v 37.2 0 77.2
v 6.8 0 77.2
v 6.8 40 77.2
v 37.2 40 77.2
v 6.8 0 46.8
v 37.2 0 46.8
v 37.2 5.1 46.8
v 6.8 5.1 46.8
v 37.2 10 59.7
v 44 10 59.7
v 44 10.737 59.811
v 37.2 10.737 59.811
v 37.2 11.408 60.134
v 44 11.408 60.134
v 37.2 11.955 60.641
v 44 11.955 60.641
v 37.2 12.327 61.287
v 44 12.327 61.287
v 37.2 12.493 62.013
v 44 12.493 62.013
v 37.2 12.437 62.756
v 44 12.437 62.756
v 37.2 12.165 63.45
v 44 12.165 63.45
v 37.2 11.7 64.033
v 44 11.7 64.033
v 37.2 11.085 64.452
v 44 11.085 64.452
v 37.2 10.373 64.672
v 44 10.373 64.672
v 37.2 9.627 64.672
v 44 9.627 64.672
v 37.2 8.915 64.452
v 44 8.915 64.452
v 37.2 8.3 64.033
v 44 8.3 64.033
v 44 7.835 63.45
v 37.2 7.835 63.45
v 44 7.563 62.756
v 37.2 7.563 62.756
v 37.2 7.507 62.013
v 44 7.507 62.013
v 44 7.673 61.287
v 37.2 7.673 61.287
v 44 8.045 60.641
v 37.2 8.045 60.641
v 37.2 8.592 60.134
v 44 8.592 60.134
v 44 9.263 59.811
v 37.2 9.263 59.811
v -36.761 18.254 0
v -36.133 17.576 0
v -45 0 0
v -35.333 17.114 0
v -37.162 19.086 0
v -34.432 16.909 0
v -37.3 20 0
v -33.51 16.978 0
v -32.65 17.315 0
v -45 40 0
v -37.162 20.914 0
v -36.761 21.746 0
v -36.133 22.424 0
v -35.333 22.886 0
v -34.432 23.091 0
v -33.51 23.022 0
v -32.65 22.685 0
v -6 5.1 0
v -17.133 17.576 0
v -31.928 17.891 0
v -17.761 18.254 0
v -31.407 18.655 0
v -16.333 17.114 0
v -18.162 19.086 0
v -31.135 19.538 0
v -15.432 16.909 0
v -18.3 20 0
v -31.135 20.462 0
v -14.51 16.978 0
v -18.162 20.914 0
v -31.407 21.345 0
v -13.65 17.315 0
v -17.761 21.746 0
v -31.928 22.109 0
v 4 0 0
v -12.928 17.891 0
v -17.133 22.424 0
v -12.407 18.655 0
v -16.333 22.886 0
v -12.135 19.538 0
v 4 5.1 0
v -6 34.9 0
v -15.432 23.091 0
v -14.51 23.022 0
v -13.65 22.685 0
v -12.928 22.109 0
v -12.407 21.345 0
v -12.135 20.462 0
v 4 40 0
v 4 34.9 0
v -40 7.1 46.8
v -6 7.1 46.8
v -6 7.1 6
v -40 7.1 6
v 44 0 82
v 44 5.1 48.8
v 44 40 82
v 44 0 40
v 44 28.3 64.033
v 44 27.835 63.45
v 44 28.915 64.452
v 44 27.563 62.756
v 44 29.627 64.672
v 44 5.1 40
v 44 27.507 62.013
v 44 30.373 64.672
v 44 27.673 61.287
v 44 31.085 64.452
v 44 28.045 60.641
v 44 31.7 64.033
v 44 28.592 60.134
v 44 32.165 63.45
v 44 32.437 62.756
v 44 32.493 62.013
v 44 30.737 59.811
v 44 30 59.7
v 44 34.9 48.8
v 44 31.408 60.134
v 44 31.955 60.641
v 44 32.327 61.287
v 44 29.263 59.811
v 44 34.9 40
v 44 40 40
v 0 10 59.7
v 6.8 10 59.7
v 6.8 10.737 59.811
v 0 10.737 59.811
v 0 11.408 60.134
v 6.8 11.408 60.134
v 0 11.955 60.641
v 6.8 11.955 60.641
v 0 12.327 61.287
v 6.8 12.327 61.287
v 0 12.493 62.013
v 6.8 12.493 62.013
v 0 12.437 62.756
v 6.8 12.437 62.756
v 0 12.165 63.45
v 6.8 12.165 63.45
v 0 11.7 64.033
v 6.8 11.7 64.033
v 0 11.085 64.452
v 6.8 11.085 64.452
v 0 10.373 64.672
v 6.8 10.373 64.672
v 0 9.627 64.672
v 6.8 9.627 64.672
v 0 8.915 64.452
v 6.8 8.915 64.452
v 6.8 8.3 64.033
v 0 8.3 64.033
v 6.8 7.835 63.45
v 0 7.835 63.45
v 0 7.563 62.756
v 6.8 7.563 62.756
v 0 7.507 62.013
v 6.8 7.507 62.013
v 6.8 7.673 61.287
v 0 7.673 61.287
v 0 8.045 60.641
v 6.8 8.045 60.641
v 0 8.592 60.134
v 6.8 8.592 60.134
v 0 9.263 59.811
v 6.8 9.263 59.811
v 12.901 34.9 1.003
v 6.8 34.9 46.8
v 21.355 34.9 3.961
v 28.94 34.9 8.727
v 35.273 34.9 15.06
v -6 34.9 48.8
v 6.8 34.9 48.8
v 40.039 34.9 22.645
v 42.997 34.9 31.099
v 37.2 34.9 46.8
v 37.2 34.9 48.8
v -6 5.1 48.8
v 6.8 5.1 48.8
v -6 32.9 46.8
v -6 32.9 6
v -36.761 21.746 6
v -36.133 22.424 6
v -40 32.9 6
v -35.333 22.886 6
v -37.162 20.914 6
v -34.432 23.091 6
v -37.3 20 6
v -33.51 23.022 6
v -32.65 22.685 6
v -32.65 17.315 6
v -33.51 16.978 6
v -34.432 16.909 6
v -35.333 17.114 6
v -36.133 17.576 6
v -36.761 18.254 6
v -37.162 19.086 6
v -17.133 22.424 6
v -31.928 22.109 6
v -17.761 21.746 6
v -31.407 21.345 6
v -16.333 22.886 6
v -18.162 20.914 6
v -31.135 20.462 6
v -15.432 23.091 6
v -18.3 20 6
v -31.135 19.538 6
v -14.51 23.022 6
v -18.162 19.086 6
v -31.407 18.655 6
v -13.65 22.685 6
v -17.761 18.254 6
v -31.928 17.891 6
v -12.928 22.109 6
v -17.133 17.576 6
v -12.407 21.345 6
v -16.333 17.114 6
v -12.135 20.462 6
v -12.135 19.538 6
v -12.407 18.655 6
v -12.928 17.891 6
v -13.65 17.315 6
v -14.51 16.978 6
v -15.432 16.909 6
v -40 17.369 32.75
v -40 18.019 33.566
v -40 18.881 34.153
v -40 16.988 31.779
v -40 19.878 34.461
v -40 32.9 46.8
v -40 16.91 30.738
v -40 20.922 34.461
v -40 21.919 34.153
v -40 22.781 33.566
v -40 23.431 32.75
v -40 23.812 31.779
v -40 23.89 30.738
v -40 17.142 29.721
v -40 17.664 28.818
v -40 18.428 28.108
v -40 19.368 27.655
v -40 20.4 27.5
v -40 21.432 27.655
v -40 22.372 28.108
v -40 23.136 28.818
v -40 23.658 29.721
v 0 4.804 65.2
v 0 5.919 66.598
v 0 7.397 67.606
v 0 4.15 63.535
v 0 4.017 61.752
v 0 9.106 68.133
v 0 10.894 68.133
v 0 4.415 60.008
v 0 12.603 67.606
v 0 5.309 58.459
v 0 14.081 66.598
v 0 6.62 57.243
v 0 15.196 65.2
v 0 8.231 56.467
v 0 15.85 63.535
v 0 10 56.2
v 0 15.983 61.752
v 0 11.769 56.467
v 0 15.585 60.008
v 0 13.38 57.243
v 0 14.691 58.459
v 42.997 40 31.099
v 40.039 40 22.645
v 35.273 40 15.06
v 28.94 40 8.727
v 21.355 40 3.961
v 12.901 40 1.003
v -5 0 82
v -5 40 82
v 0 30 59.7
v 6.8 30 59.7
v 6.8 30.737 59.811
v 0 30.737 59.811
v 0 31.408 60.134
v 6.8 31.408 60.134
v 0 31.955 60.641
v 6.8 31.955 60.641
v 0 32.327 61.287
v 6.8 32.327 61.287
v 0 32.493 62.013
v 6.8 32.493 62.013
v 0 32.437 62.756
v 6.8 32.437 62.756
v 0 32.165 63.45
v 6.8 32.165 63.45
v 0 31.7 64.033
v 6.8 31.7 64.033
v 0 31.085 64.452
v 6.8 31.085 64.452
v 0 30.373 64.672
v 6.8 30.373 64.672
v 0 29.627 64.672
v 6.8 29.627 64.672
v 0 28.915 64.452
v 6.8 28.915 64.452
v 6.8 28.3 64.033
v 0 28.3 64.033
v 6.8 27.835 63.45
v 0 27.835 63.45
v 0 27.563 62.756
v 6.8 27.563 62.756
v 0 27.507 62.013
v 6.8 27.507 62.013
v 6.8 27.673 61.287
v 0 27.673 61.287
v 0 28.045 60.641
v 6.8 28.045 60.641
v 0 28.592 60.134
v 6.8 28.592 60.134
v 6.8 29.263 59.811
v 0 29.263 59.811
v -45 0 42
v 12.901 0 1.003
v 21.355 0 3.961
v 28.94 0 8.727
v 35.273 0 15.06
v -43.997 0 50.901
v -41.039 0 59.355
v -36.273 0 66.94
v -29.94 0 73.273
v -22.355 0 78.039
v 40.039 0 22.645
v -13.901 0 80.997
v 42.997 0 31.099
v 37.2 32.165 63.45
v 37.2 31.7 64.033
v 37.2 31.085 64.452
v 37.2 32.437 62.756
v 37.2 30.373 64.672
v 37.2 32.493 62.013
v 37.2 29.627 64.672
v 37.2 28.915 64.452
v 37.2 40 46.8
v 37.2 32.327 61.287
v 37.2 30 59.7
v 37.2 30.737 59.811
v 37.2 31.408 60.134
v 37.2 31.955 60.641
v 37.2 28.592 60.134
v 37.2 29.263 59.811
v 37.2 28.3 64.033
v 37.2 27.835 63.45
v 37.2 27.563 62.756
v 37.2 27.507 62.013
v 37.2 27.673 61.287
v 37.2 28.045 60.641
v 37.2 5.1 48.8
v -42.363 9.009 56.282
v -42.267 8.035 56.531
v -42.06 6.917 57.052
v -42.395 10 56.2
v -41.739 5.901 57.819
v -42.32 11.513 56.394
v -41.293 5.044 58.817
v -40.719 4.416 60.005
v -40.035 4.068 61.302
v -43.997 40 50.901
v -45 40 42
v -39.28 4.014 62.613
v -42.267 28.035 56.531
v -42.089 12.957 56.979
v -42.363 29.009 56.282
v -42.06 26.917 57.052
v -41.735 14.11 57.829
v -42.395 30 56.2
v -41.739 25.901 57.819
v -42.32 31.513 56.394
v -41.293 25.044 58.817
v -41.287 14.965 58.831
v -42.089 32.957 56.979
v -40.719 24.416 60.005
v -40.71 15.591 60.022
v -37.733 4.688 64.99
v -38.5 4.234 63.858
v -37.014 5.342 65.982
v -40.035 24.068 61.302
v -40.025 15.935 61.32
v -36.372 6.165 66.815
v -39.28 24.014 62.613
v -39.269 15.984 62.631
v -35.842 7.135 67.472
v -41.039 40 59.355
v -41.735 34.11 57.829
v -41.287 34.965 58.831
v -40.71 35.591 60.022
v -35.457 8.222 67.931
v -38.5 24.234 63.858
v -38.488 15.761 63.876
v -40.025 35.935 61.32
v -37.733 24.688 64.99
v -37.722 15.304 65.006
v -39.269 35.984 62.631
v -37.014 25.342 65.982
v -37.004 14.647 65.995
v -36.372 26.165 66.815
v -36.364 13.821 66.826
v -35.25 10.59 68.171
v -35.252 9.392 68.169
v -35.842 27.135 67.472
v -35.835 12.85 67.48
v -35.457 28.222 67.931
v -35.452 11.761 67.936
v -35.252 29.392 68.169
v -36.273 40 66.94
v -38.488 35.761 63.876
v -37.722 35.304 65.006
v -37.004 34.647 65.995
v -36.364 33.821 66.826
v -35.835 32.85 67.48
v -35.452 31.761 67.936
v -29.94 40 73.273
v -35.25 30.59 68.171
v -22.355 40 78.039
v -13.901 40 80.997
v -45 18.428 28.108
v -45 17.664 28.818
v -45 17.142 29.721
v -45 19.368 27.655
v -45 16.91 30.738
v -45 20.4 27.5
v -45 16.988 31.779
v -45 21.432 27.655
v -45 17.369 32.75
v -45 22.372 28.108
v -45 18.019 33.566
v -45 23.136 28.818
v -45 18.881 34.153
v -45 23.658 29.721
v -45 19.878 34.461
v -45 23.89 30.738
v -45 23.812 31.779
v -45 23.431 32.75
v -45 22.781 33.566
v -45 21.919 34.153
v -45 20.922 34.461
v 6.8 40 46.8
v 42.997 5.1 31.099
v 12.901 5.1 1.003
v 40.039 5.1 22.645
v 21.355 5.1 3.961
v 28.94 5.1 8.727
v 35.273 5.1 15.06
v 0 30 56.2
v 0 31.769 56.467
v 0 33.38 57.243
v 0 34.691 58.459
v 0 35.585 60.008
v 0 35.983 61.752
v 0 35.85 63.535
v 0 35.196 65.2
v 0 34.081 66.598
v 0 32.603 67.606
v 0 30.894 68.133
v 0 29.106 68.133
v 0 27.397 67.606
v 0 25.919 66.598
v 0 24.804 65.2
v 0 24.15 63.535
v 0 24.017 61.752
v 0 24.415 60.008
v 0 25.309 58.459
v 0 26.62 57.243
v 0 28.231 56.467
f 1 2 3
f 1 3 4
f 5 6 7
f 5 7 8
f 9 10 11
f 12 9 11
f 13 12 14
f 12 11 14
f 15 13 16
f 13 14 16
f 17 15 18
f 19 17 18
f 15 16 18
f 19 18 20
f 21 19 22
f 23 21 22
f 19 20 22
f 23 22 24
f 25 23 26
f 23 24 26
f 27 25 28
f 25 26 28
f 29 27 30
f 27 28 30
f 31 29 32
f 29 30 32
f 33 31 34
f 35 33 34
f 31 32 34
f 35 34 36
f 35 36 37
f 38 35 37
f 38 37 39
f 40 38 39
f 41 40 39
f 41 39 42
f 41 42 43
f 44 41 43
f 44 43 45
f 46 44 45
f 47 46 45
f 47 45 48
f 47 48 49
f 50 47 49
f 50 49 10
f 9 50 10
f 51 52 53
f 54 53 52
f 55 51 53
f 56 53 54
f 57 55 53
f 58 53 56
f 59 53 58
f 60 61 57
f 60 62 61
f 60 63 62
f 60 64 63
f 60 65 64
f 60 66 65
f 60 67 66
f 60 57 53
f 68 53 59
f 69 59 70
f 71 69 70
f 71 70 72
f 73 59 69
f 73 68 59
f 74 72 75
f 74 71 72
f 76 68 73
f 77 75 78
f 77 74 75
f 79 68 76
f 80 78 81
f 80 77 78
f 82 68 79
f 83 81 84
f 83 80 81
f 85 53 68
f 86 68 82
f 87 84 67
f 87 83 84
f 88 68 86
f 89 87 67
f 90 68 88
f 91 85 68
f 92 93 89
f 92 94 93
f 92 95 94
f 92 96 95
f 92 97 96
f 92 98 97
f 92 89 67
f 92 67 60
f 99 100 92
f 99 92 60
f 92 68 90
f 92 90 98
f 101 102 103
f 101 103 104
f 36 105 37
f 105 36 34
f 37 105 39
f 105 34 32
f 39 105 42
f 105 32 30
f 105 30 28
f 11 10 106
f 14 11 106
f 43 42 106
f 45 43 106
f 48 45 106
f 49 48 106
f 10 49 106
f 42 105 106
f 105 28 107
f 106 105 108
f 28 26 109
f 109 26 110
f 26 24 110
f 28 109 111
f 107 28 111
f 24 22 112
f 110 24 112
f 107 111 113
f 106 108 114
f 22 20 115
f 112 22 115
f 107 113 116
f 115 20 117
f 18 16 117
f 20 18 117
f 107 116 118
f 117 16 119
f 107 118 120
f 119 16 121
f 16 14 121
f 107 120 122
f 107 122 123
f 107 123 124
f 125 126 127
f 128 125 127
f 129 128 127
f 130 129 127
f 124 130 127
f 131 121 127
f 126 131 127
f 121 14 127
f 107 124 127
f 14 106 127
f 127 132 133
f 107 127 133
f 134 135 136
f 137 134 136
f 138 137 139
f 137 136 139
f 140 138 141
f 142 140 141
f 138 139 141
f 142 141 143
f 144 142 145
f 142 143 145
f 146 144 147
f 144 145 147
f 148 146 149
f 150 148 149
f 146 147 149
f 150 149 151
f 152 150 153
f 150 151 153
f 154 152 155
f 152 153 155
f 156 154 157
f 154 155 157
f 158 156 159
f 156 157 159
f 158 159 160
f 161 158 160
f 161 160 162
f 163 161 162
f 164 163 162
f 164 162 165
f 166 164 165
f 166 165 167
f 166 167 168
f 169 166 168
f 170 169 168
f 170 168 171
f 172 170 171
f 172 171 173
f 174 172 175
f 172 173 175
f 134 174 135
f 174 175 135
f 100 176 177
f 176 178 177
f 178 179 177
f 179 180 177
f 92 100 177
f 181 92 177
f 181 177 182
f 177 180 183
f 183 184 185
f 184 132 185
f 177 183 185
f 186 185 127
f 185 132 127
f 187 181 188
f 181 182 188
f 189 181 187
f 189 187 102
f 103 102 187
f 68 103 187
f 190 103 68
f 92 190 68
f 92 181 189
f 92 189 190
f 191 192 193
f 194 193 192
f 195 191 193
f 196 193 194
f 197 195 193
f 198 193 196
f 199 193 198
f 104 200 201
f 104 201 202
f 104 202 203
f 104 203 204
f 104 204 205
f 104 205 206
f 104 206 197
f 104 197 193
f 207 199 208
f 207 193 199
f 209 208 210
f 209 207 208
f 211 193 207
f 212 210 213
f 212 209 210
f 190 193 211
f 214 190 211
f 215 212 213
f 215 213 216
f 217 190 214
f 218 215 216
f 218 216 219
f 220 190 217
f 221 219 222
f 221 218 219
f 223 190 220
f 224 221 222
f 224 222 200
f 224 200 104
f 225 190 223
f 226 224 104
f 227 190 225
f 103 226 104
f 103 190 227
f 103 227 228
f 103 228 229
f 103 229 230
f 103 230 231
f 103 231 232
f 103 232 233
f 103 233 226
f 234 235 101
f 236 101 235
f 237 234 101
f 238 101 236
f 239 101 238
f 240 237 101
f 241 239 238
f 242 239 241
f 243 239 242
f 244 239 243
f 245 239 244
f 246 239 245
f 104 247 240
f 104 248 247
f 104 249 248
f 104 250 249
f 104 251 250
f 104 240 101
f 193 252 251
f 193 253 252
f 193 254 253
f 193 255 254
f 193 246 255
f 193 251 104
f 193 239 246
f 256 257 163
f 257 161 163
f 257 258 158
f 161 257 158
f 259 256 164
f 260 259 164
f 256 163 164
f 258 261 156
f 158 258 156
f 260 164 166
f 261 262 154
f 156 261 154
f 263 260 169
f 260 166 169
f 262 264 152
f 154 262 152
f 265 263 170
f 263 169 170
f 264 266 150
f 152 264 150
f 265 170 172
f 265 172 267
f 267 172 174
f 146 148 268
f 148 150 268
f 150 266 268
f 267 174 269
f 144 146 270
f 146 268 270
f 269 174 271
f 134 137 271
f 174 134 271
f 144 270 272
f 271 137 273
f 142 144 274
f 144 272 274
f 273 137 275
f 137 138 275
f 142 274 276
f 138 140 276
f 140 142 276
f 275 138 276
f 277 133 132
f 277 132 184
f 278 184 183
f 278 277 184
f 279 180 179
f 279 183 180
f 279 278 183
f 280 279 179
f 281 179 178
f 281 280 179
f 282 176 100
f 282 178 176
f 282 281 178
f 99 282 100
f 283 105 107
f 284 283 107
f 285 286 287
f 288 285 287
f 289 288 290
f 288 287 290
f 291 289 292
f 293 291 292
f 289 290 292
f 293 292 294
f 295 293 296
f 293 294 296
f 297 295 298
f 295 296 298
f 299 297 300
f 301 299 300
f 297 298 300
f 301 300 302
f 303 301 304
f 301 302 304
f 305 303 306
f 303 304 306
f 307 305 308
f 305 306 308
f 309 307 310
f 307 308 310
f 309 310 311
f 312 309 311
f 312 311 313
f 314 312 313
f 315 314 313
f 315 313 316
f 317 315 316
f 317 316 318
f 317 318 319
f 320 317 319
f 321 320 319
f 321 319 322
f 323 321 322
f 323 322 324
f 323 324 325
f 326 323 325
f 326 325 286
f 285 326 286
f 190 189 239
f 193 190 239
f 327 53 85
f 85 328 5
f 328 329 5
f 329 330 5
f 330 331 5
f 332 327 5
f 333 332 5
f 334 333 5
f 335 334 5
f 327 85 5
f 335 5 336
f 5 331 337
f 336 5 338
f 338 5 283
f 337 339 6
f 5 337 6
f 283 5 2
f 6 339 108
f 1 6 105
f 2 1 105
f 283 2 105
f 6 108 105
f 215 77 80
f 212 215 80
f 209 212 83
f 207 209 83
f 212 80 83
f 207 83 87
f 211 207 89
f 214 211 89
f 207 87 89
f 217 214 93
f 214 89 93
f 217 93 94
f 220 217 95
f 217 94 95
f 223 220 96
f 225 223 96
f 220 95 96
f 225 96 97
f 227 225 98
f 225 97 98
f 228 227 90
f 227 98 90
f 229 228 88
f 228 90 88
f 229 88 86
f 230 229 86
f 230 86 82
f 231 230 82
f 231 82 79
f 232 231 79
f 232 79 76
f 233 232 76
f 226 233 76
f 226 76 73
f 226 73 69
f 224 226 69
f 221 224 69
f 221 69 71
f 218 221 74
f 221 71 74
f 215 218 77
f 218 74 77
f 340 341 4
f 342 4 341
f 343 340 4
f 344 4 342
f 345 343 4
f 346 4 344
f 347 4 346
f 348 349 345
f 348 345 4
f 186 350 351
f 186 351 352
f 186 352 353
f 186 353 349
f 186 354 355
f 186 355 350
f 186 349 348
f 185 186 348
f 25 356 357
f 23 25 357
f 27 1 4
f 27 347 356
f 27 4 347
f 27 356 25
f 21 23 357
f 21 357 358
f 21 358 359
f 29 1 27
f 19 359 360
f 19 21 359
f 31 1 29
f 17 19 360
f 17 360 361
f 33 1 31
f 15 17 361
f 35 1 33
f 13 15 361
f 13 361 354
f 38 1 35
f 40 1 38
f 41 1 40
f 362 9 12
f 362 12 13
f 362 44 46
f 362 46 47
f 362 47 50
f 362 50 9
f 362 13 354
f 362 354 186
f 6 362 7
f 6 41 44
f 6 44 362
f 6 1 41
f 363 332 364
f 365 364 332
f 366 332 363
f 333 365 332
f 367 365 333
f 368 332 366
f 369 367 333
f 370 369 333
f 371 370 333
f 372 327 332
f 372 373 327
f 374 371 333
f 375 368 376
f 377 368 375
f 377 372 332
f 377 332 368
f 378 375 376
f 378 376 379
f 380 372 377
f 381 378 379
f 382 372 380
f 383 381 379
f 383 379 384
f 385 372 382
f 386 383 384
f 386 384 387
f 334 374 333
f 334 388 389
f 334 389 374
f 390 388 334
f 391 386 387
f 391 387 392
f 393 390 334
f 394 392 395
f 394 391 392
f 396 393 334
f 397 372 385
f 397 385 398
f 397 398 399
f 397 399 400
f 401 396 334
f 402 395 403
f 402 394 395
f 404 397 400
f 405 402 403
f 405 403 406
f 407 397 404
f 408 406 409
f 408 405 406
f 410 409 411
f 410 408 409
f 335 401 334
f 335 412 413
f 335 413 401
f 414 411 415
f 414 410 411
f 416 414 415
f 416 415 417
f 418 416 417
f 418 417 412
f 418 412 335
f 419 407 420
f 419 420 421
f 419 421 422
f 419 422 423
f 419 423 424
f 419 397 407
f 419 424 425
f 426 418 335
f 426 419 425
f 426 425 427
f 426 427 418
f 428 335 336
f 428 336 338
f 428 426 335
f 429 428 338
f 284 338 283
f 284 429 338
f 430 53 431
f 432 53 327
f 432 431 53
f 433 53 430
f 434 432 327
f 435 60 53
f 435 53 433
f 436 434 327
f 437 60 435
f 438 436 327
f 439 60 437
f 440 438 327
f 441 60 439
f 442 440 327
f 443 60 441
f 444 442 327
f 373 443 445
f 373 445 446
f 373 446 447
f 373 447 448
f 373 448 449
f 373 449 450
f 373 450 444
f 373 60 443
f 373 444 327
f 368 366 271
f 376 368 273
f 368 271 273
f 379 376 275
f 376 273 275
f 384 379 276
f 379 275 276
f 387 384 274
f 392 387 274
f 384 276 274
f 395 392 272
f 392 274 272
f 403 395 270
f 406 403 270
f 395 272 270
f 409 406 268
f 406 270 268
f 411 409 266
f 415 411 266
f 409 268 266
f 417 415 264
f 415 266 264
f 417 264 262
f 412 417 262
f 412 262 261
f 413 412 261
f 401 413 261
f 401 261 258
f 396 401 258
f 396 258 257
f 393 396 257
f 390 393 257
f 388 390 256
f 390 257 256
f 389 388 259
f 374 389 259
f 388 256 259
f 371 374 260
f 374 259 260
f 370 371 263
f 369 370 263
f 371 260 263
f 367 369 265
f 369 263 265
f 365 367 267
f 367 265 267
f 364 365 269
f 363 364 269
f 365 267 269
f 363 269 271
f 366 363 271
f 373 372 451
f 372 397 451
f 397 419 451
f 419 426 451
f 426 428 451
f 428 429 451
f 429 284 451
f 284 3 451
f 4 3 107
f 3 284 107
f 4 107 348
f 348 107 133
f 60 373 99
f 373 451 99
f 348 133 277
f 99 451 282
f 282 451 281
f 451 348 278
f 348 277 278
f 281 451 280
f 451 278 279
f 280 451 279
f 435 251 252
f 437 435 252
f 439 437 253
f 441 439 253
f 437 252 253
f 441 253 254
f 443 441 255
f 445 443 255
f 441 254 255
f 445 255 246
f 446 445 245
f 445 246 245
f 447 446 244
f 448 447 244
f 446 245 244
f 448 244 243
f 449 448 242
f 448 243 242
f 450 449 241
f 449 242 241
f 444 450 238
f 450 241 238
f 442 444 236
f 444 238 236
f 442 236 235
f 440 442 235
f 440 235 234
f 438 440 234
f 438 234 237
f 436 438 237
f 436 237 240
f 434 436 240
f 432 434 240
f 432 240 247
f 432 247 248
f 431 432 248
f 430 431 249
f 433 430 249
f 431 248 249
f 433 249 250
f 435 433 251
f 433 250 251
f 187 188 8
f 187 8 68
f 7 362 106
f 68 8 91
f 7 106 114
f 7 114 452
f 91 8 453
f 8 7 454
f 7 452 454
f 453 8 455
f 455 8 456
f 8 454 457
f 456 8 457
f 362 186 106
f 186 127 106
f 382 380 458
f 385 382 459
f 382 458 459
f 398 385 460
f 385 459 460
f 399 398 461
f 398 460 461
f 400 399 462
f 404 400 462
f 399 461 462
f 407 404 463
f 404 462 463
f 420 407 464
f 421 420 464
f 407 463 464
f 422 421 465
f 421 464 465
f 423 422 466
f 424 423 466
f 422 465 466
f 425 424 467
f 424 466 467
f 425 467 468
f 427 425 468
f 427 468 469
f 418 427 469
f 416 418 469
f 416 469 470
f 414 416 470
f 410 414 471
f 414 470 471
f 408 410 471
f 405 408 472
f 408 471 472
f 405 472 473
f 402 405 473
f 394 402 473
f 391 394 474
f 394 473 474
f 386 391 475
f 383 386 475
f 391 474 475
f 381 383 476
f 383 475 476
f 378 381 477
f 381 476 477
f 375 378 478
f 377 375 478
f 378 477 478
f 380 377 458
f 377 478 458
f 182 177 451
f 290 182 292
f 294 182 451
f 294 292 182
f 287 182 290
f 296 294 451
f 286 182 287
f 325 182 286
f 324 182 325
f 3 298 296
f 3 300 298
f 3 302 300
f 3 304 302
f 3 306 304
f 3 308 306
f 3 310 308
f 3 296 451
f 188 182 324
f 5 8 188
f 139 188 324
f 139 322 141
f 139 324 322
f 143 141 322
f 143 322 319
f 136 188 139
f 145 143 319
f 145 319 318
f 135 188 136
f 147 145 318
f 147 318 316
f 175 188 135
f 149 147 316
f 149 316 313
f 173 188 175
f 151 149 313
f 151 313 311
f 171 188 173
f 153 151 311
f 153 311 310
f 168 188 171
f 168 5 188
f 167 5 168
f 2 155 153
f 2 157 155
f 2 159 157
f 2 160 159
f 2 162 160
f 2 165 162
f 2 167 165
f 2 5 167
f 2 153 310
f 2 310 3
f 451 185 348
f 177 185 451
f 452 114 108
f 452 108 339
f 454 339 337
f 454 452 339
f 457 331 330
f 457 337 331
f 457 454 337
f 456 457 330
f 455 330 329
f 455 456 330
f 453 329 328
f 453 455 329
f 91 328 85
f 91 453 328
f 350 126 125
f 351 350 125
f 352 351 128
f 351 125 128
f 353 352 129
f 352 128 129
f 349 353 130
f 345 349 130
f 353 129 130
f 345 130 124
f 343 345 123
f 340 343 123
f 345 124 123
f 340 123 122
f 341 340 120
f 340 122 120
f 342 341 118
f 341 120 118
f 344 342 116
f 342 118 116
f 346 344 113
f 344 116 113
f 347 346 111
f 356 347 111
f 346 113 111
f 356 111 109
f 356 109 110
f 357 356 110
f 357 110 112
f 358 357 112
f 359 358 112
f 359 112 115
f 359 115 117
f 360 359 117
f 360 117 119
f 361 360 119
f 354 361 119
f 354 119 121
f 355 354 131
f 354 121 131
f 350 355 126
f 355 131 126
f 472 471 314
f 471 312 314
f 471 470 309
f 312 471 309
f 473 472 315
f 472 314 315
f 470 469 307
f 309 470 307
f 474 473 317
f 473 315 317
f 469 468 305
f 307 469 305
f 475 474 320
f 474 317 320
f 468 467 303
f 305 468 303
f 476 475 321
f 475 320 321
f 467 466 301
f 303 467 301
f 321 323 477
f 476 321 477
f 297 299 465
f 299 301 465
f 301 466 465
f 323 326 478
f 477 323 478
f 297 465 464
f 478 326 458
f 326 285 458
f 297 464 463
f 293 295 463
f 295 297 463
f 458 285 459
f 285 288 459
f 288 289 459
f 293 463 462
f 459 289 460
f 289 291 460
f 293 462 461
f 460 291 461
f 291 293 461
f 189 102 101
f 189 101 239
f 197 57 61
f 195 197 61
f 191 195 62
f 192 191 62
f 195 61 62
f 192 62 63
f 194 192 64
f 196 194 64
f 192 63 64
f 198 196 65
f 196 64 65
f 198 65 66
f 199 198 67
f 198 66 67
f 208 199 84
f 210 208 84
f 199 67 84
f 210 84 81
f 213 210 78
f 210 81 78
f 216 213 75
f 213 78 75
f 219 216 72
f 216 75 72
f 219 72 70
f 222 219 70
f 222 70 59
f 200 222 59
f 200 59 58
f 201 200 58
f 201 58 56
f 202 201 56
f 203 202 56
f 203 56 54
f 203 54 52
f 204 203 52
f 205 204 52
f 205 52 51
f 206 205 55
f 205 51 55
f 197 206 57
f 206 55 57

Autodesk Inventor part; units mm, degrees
ref_plane "YZ Plane" through (0, 0, 0) normal (1, 0, 0) x (0, 1, 0)
ref_plane "XZ Plane" through (0, 0, 0) normal (0, 1, 0) x (-1, 0, 0)
ref_plane "XY Plane" through (0, 0, 0) normal (0, 0, 1) x (1, 0, 0)
sketch "Sketch1" plane through (0, 0, 0) normal (0, 0, 1) x (1, 0, 0)
  line L0 (0, 0) -> (44, 0)
  line L1 (44, 0) -> (44, 40)
  line L2 (44, 40) -> (0, 40)
  line L3 (0, 40) -> (0, 0)
  dimension "d0" = 44
  dimension "d1" = 40
extrude "Extrusion1" add sketch "Sketch1" along normal blind 82
sketch "Sketch2" plane through (0, 0, 0) normal (0, -1, 0) x (1, 0, 0)
  line L0 (6.8, 77.2) -> (37.2, 77.2)
  line L1 (37.2, 77.2) -> (37.2, 46.8)
  line L2 (37.2, 46.8) -> (6.8, 46.8)
  line L3 (6.8, 46.8) -> (6.8, 77.2)
  line L4 (0, 0) -> (0, 82) projected
  line L5 (0, 82) -> (44, 82) projected
  dimension "d4" = 30.4
  dimension "d5" = 30.4
  dimension "d6" = 6.8
  dimension "d7" = 4.8
extrude "Extrusion2" cut sketch "Sketch2" against normal blind 50
sketch "Sketch6" plane through (44, 0, 0) normal (1, 0, 0) x (0, 0, -1)
  circle A0 centre (-62.2, 30) radius 2.5
  circle A1 centre (-62.2, 10) radius 2.5
  line L0 (0, 40) -> (-82, 40) projected
  line L1 (0, 0) -> (-82, 0) projected
  point P0 (-77.2, 40)
  dimension "d24" = 5
  dimension "d25" = 10
  dimension "d26" = 5
  dimension "d27" = 10
  dimension "d28" = 15
  dimension "d29" = 15
extrude "Extrusion5" cut sketch "Sketch6" against normal blind 120
sketch "Sketch8" plane through (0, 0, 0) normal (-1, 0, 0) x (0, 0, 1)
  line L0 (0, 0) -> (0, 40) projected
  line L1 (77.2, 40) -> (46.8, 40) projected
  line L2 (0, 0) -> (82, 0)
  line L3 (82, 0) -> (82, 40)
  line L4 (82, 40) -> (0, 40)
  line L5 (0, 40) -> (0, 0)
  line L6 (82, 40) -> (82, 0) projected
extrude "Extrusion7" add sketch "Sketch8" along normal blind 45
sketch "Sketch4" plane through (44, 0, 0) normal (1, 0, 0) x (0, 0, -1)
  line L0 (-6, 7.1) -> (-46.8, 7.1)
  line L1 (-46.8, 7.1) -> (-46.8, 32.9)
  line L2 (-46.8, 32.9) -> (-6, 32.9)
  line L3 (-6, 32.9) -> (-6, 7.1)
  line L4 (0, 0) -> (0, 40) projected
  line L5 (0, 0) -> (-82, 0) projected
  line L6 (-46.8, 0) -> (-46.8, 40) projected
  point P0 (0, 20)
  point P1 (-6, 20)
  dimension "d10" = 25.8
  dimension "d11" = 40.8
  dimension "d13" = 7.1
extrude "Extrusion3" cut sketch "Sketch4" against normal blind 84
sketch "Sketch5" plane through (0, 0, 0) normal (0, 0, -1) x (-1, 0, 0)
  circle A0 centre (34.2, 20) radius 3.1
  circle A1 centre (15.2, 20) radius 3.1
  line L0 (-44, 40) -> (0, 40) projected
  line L1 (45, 40) -> (45, 0) projected
  point P0 (0, 0)
  dimension "d16" = 6.2
  dimension "d17" = 6.2
  dimension "d18" = 20
  dimension "d19" = 20
  dimension "d21" = 19
  dimension "d40" = 10.8
extrude "Extrusion4" cut sketch "Sketch5" against normal blind 34
sketch "Sketch9" plane through (44, 7.1, 6) normal (0, 0, 1) x (1, 0, 0)
  line L0 (0, 25.8) -> (-84, 25.8) projected
  line L1 (0, 0) -> (-84, 0) projected
  line L2 (0, 25.8) -> (-50, 25.8)
  line L3 (-50, 25.8) -> (-50, 0)
  line L4 (-50, 0) -> (0, 0)
  line L5 (0, 0) -> (0, 25.8)
  line L6 (-84, 25.8) -> (-84, 0) projected
  point P0 (-44, -7.1)
  point P1 (-50, 25.8)
  point P2 (-84, 0)
  dimension "d41" = 34
extrude "Extrusion8" cut sketch "Sketch9" against normal blind 10 contours L5 L1 L3 L0
sketch "Sketch10" plane through (44, 0, 82) normal (1, 0, 0) x (0, 0, -1)
  line L0 (33.2, 5.1) -> (82, 5.1)
  line L1 (82, 5.1) -> (82, 34.9)
  line L2 (82, 34.9) -> (33.2, 34.9)
  line L3 (33.2, 34.9) -> (33.2, 5.1)
  line L4 (35.2, 7.1) -> (35.2, 32.9) projected
  line L5 (82, 7.1) -> (35.2, 7.1) projected
  line L6 (35.2, 32.9) -> (82, 32.9) projected
  point P0 (82, 0)
  dimension "d44" = 2
  dimension "d45" = 2
  dimension "d46" = 2
extrude "Extrusion9" cut sketch "Sketch10" against normal up to surface (50 mm away) contours L3 L2 L1 L6 L4 L5 L0
fillet "Fillet1" radius 40 3 edges at (44, 2.55, 0) (44, 37.45, 0) (-45, 20, 82)
sketch "Sketch11" plane through (-40, 0, 0) normal (1, 0, 0) x (0, 0, -1)
  circle A0 centre (-31, 20.4) radius 3.5
  line L0 (-6, 32.9) -> (0, 32.9) projected
  line L1 (-6, 7.1) -> (-6, 32.9) projected
  line L2 (-46.8, 32.9) -> (-6, 32.9) projected
  point P0 (0, 0)
  point P1 (-46.8, 32.7)
  point P2 (-6, 20)
  point P3 (0, 32.9)
  dimension "d50" = 7
  dimension "d52" = 25
  dimension "d55" = 12.5
extrude "Extrusion10" cut sketch "Sketch11" against normal blind 109
sketch "Sketch12" plane through (0, 30, 62.2) normal (1, 0, 0) x (0, 0, -1)
  circle A0 centre (0, 0) radius 6
  circle A1 centre (0, -20) radius 6
  circle A2 centre (0, -20) radius 2.5 projected
  circle A3 centre (0, 0) radius 2.5 projected
  point P0 (62.2, -30)
  dimension "d56" = 12
  dimension "d57" = 12
extrude "Extrusion11" cut sketch "Sketch12" against normal blind 120 contours A0 | A1 | A2 | A3
properties part number "loacell_mount2"
